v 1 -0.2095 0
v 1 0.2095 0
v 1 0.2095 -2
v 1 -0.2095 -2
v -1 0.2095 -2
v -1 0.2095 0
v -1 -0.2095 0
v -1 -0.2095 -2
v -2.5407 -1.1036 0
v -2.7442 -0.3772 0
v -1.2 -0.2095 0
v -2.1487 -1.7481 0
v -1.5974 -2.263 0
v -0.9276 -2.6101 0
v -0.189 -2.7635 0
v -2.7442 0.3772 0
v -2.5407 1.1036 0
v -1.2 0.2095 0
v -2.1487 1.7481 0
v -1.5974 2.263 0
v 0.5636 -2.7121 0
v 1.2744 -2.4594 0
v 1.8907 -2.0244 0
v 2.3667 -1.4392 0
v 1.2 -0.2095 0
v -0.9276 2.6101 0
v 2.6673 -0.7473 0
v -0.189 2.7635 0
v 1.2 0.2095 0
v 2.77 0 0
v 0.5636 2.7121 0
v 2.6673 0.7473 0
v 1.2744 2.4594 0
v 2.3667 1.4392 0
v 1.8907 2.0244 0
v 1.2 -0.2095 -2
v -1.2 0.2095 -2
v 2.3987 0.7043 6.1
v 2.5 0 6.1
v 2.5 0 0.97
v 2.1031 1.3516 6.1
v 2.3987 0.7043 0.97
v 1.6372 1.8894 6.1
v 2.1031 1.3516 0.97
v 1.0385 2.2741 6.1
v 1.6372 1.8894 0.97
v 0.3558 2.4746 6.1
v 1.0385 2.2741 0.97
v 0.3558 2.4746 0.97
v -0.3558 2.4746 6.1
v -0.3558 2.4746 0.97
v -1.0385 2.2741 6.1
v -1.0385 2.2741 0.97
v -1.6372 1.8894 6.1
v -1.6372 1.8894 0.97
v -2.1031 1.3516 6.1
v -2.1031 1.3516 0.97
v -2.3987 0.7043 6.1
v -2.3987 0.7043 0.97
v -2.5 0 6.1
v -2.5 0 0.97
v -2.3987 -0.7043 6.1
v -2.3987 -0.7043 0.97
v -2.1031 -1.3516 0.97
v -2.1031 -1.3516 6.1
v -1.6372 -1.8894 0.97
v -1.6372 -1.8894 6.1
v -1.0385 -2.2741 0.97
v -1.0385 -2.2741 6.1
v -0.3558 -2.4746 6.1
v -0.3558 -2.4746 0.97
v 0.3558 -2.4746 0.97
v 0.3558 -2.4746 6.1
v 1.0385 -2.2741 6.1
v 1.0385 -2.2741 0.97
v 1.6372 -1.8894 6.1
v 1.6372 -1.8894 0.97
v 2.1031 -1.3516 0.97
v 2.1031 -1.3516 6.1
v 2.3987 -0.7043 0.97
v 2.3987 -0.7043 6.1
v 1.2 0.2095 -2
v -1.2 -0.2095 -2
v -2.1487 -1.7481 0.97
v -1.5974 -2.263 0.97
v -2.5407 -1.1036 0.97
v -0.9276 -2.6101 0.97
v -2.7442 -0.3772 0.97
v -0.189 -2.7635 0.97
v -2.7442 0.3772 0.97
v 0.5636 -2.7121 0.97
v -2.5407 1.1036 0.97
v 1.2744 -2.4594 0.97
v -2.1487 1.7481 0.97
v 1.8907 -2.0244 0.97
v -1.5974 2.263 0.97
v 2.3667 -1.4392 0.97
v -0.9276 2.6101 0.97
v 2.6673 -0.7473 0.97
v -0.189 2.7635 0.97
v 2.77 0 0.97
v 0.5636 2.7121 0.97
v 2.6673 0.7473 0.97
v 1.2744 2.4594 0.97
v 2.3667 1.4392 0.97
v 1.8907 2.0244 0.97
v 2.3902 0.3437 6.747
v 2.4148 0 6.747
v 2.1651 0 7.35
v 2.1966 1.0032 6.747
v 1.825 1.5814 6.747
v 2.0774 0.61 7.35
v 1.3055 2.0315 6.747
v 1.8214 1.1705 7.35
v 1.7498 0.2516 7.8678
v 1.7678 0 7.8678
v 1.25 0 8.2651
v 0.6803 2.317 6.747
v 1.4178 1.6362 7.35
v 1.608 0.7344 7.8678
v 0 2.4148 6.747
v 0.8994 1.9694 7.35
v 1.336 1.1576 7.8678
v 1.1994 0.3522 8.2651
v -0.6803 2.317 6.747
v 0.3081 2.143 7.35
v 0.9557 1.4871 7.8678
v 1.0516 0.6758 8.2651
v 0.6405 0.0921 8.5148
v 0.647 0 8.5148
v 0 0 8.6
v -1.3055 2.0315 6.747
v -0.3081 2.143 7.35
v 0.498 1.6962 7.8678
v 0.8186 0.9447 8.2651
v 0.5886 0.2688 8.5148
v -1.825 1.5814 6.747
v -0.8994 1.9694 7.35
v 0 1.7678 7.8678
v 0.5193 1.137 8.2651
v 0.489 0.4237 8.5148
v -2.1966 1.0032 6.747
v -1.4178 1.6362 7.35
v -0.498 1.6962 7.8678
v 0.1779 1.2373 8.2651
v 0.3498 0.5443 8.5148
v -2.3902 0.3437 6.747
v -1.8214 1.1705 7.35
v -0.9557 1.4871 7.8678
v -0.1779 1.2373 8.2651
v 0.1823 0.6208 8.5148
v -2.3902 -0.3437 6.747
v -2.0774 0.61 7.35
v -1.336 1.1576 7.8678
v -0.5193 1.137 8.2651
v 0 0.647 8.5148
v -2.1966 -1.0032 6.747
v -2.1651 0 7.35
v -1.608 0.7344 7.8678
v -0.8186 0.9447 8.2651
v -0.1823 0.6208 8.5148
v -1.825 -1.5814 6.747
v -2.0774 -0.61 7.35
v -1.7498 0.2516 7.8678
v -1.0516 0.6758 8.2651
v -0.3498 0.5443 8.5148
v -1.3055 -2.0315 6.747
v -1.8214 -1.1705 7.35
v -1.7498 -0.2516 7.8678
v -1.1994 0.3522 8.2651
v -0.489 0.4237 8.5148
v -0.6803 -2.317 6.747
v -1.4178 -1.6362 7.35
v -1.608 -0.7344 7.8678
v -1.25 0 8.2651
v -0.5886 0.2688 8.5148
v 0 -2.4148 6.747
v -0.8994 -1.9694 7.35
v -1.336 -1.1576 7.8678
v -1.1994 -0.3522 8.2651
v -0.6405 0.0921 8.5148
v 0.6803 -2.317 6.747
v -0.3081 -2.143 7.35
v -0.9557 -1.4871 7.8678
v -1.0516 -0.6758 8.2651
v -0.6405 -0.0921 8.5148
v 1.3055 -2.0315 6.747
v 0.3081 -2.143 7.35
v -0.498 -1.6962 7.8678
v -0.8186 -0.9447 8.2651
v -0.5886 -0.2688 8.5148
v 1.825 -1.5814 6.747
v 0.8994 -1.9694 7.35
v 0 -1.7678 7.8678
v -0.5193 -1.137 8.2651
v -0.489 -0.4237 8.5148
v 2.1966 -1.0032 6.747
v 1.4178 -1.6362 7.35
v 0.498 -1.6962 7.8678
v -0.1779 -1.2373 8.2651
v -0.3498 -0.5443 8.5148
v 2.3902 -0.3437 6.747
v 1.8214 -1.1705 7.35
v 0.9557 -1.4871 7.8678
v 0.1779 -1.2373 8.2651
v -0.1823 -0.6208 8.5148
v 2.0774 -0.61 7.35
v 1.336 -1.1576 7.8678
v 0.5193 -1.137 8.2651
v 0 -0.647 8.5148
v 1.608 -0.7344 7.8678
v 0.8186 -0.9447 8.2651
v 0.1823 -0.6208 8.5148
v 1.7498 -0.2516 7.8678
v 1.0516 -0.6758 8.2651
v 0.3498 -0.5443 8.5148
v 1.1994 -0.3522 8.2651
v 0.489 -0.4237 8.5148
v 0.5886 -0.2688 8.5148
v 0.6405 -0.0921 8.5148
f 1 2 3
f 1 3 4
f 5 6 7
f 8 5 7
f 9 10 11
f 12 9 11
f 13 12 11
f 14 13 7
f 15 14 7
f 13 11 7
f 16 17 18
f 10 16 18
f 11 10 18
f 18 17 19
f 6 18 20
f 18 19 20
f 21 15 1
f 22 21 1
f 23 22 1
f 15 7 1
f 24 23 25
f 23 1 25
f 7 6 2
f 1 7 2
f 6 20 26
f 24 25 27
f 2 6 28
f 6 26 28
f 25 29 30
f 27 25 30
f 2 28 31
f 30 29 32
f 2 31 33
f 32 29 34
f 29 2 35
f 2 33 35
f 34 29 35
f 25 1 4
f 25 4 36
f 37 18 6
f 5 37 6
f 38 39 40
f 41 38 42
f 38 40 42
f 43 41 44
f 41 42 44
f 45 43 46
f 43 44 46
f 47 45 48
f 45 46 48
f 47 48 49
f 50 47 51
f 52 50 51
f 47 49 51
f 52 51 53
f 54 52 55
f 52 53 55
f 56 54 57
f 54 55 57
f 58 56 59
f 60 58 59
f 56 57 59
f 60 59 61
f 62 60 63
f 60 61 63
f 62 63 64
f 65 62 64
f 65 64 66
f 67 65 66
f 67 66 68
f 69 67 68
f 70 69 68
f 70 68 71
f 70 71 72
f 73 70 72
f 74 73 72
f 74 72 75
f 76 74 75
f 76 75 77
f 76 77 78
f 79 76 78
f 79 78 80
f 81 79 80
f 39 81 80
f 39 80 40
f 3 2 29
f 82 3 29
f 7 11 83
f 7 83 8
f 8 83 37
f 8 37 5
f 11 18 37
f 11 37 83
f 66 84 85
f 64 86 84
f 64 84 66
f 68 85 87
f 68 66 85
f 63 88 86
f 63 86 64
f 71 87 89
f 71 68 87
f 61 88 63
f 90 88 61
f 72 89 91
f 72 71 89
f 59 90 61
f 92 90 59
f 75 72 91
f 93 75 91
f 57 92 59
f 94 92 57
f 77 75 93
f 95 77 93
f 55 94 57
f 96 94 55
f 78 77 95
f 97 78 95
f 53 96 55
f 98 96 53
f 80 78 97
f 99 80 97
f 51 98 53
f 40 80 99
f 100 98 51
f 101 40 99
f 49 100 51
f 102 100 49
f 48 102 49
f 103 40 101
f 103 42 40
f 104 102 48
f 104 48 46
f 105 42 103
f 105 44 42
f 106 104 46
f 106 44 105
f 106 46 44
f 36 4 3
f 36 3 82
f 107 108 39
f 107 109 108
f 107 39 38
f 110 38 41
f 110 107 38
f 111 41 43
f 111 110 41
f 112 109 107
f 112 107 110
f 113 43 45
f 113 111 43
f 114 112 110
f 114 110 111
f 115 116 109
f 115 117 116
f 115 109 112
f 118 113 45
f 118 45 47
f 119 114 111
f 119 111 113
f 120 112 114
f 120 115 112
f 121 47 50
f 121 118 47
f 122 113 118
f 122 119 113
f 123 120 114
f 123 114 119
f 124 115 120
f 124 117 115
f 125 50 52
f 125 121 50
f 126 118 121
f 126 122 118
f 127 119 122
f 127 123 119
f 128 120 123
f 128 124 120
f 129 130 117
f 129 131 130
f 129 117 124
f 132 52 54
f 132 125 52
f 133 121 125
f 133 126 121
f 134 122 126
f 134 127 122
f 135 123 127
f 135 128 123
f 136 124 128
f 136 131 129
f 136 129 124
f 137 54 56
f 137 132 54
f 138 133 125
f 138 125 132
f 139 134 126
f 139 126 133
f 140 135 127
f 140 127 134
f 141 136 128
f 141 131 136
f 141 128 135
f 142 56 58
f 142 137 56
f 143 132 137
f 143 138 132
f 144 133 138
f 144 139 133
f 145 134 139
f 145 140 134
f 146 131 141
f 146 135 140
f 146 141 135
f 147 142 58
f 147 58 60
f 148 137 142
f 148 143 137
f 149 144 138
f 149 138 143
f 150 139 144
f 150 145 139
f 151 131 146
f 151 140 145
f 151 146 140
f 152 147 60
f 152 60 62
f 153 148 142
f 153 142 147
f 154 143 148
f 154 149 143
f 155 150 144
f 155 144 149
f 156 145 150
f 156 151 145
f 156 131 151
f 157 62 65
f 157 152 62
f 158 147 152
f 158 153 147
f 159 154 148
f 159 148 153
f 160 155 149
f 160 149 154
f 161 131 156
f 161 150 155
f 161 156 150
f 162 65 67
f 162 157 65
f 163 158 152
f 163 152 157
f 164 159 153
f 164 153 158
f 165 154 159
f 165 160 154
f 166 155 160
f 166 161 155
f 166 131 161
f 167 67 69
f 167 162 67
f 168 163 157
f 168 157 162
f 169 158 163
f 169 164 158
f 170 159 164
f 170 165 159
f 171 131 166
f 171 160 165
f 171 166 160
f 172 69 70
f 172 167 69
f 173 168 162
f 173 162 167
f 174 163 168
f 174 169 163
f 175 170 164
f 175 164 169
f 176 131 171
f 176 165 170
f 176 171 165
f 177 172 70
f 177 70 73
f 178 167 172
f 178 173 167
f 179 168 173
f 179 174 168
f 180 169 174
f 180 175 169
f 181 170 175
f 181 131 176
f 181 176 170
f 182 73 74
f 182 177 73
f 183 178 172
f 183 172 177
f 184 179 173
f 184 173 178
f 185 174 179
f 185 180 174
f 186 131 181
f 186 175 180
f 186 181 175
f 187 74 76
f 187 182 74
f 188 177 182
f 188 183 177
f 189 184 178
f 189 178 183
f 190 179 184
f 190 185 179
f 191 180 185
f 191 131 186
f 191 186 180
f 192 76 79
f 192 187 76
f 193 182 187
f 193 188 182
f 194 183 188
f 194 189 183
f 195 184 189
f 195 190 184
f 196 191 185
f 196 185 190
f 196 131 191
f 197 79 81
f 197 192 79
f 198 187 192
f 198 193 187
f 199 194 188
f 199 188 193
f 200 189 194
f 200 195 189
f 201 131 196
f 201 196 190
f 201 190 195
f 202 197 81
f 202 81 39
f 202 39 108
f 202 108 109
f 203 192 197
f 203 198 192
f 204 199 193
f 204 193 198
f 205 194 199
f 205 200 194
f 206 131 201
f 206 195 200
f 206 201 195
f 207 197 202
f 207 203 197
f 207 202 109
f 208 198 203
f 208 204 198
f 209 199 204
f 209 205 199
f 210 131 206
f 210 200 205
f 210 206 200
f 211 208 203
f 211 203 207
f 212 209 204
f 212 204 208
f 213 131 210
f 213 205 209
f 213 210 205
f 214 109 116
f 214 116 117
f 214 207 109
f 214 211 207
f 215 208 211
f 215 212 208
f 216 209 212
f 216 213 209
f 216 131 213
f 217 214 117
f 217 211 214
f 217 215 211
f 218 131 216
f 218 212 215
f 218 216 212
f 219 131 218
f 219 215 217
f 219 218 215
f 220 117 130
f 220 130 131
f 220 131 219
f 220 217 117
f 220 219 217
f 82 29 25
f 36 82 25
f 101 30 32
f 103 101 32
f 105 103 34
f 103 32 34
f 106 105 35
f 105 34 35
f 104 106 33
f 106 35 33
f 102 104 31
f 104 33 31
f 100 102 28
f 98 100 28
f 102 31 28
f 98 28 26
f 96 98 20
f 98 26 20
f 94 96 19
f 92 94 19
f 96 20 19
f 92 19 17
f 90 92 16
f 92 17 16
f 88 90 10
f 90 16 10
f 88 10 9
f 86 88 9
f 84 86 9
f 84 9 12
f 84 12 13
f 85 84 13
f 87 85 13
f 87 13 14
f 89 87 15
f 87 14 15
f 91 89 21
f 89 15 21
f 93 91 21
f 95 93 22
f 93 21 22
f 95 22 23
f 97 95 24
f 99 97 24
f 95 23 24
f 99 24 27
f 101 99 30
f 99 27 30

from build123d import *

# Parameters (mm, degrees)
F0_R     = 2.77
F0_R_2   = 2.5
F1_DEPTH = 0.97
F2_DEPTH = 8.6
F3_R     = 2.5
F4_W     = 0.2
F4_H     = 0.418926
F5_DEPTH = 2


with BuildPart() as f1:
    # F0 (on Top) → F1 (new body)
    with BuildSketch(Plane.XY):
        Circle(F0_R)
        Circle(F0_R_2, mode=Mode.SUBTRACT)
        Circle(F0_R_2)
    extrude(amount=F1_DEPTH)

    # F0 (on Top) → F2 (join)
    with BuildSketch(Plane.XY):
        Circle(F0_R_2)
    extrude(amount=F2_DEPTH)

    # F3
    f3_edges = [f1.edges().sort_by_distance(p)[0] for p in [
        (-2.5, 0, 8.6),
    ]]
    fillet(f3_edges, radius=F3_R)

    # F4 (on face) → F5 (join)
    with BuildSketch(Plane(origin=(0, 0, 0), x_dir=(1, 0, 0), z_dir=(0, 0, -1))):
        with Locations((-1.1, 0)):
            Rectangle(F4_W, F4_H)
        with Locations((1.1, 0)):
            Rectangle(F4_W, F4_H)
    extrude(amount=F5_DEPTH)


solid = f1.part
